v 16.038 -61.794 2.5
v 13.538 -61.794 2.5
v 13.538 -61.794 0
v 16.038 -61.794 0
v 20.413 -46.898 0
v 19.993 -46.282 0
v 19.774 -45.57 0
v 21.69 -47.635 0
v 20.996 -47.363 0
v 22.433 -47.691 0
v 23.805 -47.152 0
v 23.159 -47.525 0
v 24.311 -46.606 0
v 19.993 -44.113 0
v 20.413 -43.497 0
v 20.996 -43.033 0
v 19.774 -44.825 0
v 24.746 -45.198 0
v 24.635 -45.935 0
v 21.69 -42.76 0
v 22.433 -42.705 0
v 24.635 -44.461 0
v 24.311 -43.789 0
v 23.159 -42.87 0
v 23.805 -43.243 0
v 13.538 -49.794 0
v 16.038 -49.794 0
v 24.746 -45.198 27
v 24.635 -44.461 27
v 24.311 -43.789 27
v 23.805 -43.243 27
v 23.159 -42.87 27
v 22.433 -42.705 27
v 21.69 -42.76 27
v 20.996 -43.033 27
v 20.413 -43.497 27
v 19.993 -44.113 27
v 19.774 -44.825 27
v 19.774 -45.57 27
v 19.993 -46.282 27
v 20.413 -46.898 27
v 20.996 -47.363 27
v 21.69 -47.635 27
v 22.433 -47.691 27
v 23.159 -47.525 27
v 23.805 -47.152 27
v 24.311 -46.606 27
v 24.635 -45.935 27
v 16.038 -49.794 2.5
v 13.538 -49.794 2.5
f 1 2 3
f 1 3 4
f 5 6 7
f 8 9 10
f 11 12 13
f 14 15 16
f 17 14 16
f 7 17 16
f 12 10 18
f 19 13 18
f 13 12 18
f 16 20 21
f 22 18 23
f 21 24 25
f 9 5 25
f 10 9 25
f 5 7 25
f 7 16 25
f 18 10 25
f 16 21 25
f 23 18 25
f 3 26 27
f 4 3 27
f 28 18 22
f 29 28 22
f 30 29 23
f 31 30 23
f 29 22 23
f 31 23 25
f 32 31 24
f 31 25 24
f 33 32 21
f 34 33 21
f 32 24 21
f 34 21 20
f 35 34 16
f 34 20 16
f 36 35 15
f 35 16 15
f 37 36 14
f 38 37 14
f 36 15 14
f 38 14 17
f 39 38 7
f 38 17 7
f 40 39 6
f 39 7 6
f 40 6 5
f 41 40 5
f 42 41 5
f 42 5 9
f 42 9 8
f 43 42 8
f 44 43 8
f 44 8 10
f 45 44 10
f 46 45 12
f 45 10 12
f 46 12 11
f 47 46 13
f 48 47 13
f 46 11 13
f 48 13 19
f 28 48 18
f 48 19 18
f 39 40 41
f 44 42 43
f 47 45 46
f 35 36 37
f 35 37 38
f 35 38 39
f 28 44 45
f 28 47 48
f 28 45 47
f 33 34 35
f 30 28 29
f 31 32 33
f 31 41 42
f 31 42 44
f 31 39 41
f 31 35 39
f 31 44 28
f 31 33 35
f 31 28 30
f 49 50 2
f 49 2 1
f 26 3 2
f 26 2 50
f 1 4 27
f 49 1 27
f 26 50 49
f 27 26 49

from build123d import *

# Parameters (mm, degrees)
F0_R     = 2.5
F1_DEPTH = 27
F2_W     = 2.5
F2_H     = 12
F3_DEPTH = 2.5


with BuildPart() as f1:
    # F0 (on Top) → F1 (new body)
    with BuildSketch(Plane.XY):
        with Locations((22.245873, -45.197681)):
            Circle(F0_R)
    extrude(amount=F1_DEPTH)


with BuildPart() as f3:
    # F2 (on Top) → F3 (new body)
    with BuildSketch(Plane.XY):
        with Locations((14.787501, -55.793846)):
            Rectangle(F2_W, F2_H)
    extrude(amount=F3_DEPTH)


solid = Compound([f1.part, f3.part])
